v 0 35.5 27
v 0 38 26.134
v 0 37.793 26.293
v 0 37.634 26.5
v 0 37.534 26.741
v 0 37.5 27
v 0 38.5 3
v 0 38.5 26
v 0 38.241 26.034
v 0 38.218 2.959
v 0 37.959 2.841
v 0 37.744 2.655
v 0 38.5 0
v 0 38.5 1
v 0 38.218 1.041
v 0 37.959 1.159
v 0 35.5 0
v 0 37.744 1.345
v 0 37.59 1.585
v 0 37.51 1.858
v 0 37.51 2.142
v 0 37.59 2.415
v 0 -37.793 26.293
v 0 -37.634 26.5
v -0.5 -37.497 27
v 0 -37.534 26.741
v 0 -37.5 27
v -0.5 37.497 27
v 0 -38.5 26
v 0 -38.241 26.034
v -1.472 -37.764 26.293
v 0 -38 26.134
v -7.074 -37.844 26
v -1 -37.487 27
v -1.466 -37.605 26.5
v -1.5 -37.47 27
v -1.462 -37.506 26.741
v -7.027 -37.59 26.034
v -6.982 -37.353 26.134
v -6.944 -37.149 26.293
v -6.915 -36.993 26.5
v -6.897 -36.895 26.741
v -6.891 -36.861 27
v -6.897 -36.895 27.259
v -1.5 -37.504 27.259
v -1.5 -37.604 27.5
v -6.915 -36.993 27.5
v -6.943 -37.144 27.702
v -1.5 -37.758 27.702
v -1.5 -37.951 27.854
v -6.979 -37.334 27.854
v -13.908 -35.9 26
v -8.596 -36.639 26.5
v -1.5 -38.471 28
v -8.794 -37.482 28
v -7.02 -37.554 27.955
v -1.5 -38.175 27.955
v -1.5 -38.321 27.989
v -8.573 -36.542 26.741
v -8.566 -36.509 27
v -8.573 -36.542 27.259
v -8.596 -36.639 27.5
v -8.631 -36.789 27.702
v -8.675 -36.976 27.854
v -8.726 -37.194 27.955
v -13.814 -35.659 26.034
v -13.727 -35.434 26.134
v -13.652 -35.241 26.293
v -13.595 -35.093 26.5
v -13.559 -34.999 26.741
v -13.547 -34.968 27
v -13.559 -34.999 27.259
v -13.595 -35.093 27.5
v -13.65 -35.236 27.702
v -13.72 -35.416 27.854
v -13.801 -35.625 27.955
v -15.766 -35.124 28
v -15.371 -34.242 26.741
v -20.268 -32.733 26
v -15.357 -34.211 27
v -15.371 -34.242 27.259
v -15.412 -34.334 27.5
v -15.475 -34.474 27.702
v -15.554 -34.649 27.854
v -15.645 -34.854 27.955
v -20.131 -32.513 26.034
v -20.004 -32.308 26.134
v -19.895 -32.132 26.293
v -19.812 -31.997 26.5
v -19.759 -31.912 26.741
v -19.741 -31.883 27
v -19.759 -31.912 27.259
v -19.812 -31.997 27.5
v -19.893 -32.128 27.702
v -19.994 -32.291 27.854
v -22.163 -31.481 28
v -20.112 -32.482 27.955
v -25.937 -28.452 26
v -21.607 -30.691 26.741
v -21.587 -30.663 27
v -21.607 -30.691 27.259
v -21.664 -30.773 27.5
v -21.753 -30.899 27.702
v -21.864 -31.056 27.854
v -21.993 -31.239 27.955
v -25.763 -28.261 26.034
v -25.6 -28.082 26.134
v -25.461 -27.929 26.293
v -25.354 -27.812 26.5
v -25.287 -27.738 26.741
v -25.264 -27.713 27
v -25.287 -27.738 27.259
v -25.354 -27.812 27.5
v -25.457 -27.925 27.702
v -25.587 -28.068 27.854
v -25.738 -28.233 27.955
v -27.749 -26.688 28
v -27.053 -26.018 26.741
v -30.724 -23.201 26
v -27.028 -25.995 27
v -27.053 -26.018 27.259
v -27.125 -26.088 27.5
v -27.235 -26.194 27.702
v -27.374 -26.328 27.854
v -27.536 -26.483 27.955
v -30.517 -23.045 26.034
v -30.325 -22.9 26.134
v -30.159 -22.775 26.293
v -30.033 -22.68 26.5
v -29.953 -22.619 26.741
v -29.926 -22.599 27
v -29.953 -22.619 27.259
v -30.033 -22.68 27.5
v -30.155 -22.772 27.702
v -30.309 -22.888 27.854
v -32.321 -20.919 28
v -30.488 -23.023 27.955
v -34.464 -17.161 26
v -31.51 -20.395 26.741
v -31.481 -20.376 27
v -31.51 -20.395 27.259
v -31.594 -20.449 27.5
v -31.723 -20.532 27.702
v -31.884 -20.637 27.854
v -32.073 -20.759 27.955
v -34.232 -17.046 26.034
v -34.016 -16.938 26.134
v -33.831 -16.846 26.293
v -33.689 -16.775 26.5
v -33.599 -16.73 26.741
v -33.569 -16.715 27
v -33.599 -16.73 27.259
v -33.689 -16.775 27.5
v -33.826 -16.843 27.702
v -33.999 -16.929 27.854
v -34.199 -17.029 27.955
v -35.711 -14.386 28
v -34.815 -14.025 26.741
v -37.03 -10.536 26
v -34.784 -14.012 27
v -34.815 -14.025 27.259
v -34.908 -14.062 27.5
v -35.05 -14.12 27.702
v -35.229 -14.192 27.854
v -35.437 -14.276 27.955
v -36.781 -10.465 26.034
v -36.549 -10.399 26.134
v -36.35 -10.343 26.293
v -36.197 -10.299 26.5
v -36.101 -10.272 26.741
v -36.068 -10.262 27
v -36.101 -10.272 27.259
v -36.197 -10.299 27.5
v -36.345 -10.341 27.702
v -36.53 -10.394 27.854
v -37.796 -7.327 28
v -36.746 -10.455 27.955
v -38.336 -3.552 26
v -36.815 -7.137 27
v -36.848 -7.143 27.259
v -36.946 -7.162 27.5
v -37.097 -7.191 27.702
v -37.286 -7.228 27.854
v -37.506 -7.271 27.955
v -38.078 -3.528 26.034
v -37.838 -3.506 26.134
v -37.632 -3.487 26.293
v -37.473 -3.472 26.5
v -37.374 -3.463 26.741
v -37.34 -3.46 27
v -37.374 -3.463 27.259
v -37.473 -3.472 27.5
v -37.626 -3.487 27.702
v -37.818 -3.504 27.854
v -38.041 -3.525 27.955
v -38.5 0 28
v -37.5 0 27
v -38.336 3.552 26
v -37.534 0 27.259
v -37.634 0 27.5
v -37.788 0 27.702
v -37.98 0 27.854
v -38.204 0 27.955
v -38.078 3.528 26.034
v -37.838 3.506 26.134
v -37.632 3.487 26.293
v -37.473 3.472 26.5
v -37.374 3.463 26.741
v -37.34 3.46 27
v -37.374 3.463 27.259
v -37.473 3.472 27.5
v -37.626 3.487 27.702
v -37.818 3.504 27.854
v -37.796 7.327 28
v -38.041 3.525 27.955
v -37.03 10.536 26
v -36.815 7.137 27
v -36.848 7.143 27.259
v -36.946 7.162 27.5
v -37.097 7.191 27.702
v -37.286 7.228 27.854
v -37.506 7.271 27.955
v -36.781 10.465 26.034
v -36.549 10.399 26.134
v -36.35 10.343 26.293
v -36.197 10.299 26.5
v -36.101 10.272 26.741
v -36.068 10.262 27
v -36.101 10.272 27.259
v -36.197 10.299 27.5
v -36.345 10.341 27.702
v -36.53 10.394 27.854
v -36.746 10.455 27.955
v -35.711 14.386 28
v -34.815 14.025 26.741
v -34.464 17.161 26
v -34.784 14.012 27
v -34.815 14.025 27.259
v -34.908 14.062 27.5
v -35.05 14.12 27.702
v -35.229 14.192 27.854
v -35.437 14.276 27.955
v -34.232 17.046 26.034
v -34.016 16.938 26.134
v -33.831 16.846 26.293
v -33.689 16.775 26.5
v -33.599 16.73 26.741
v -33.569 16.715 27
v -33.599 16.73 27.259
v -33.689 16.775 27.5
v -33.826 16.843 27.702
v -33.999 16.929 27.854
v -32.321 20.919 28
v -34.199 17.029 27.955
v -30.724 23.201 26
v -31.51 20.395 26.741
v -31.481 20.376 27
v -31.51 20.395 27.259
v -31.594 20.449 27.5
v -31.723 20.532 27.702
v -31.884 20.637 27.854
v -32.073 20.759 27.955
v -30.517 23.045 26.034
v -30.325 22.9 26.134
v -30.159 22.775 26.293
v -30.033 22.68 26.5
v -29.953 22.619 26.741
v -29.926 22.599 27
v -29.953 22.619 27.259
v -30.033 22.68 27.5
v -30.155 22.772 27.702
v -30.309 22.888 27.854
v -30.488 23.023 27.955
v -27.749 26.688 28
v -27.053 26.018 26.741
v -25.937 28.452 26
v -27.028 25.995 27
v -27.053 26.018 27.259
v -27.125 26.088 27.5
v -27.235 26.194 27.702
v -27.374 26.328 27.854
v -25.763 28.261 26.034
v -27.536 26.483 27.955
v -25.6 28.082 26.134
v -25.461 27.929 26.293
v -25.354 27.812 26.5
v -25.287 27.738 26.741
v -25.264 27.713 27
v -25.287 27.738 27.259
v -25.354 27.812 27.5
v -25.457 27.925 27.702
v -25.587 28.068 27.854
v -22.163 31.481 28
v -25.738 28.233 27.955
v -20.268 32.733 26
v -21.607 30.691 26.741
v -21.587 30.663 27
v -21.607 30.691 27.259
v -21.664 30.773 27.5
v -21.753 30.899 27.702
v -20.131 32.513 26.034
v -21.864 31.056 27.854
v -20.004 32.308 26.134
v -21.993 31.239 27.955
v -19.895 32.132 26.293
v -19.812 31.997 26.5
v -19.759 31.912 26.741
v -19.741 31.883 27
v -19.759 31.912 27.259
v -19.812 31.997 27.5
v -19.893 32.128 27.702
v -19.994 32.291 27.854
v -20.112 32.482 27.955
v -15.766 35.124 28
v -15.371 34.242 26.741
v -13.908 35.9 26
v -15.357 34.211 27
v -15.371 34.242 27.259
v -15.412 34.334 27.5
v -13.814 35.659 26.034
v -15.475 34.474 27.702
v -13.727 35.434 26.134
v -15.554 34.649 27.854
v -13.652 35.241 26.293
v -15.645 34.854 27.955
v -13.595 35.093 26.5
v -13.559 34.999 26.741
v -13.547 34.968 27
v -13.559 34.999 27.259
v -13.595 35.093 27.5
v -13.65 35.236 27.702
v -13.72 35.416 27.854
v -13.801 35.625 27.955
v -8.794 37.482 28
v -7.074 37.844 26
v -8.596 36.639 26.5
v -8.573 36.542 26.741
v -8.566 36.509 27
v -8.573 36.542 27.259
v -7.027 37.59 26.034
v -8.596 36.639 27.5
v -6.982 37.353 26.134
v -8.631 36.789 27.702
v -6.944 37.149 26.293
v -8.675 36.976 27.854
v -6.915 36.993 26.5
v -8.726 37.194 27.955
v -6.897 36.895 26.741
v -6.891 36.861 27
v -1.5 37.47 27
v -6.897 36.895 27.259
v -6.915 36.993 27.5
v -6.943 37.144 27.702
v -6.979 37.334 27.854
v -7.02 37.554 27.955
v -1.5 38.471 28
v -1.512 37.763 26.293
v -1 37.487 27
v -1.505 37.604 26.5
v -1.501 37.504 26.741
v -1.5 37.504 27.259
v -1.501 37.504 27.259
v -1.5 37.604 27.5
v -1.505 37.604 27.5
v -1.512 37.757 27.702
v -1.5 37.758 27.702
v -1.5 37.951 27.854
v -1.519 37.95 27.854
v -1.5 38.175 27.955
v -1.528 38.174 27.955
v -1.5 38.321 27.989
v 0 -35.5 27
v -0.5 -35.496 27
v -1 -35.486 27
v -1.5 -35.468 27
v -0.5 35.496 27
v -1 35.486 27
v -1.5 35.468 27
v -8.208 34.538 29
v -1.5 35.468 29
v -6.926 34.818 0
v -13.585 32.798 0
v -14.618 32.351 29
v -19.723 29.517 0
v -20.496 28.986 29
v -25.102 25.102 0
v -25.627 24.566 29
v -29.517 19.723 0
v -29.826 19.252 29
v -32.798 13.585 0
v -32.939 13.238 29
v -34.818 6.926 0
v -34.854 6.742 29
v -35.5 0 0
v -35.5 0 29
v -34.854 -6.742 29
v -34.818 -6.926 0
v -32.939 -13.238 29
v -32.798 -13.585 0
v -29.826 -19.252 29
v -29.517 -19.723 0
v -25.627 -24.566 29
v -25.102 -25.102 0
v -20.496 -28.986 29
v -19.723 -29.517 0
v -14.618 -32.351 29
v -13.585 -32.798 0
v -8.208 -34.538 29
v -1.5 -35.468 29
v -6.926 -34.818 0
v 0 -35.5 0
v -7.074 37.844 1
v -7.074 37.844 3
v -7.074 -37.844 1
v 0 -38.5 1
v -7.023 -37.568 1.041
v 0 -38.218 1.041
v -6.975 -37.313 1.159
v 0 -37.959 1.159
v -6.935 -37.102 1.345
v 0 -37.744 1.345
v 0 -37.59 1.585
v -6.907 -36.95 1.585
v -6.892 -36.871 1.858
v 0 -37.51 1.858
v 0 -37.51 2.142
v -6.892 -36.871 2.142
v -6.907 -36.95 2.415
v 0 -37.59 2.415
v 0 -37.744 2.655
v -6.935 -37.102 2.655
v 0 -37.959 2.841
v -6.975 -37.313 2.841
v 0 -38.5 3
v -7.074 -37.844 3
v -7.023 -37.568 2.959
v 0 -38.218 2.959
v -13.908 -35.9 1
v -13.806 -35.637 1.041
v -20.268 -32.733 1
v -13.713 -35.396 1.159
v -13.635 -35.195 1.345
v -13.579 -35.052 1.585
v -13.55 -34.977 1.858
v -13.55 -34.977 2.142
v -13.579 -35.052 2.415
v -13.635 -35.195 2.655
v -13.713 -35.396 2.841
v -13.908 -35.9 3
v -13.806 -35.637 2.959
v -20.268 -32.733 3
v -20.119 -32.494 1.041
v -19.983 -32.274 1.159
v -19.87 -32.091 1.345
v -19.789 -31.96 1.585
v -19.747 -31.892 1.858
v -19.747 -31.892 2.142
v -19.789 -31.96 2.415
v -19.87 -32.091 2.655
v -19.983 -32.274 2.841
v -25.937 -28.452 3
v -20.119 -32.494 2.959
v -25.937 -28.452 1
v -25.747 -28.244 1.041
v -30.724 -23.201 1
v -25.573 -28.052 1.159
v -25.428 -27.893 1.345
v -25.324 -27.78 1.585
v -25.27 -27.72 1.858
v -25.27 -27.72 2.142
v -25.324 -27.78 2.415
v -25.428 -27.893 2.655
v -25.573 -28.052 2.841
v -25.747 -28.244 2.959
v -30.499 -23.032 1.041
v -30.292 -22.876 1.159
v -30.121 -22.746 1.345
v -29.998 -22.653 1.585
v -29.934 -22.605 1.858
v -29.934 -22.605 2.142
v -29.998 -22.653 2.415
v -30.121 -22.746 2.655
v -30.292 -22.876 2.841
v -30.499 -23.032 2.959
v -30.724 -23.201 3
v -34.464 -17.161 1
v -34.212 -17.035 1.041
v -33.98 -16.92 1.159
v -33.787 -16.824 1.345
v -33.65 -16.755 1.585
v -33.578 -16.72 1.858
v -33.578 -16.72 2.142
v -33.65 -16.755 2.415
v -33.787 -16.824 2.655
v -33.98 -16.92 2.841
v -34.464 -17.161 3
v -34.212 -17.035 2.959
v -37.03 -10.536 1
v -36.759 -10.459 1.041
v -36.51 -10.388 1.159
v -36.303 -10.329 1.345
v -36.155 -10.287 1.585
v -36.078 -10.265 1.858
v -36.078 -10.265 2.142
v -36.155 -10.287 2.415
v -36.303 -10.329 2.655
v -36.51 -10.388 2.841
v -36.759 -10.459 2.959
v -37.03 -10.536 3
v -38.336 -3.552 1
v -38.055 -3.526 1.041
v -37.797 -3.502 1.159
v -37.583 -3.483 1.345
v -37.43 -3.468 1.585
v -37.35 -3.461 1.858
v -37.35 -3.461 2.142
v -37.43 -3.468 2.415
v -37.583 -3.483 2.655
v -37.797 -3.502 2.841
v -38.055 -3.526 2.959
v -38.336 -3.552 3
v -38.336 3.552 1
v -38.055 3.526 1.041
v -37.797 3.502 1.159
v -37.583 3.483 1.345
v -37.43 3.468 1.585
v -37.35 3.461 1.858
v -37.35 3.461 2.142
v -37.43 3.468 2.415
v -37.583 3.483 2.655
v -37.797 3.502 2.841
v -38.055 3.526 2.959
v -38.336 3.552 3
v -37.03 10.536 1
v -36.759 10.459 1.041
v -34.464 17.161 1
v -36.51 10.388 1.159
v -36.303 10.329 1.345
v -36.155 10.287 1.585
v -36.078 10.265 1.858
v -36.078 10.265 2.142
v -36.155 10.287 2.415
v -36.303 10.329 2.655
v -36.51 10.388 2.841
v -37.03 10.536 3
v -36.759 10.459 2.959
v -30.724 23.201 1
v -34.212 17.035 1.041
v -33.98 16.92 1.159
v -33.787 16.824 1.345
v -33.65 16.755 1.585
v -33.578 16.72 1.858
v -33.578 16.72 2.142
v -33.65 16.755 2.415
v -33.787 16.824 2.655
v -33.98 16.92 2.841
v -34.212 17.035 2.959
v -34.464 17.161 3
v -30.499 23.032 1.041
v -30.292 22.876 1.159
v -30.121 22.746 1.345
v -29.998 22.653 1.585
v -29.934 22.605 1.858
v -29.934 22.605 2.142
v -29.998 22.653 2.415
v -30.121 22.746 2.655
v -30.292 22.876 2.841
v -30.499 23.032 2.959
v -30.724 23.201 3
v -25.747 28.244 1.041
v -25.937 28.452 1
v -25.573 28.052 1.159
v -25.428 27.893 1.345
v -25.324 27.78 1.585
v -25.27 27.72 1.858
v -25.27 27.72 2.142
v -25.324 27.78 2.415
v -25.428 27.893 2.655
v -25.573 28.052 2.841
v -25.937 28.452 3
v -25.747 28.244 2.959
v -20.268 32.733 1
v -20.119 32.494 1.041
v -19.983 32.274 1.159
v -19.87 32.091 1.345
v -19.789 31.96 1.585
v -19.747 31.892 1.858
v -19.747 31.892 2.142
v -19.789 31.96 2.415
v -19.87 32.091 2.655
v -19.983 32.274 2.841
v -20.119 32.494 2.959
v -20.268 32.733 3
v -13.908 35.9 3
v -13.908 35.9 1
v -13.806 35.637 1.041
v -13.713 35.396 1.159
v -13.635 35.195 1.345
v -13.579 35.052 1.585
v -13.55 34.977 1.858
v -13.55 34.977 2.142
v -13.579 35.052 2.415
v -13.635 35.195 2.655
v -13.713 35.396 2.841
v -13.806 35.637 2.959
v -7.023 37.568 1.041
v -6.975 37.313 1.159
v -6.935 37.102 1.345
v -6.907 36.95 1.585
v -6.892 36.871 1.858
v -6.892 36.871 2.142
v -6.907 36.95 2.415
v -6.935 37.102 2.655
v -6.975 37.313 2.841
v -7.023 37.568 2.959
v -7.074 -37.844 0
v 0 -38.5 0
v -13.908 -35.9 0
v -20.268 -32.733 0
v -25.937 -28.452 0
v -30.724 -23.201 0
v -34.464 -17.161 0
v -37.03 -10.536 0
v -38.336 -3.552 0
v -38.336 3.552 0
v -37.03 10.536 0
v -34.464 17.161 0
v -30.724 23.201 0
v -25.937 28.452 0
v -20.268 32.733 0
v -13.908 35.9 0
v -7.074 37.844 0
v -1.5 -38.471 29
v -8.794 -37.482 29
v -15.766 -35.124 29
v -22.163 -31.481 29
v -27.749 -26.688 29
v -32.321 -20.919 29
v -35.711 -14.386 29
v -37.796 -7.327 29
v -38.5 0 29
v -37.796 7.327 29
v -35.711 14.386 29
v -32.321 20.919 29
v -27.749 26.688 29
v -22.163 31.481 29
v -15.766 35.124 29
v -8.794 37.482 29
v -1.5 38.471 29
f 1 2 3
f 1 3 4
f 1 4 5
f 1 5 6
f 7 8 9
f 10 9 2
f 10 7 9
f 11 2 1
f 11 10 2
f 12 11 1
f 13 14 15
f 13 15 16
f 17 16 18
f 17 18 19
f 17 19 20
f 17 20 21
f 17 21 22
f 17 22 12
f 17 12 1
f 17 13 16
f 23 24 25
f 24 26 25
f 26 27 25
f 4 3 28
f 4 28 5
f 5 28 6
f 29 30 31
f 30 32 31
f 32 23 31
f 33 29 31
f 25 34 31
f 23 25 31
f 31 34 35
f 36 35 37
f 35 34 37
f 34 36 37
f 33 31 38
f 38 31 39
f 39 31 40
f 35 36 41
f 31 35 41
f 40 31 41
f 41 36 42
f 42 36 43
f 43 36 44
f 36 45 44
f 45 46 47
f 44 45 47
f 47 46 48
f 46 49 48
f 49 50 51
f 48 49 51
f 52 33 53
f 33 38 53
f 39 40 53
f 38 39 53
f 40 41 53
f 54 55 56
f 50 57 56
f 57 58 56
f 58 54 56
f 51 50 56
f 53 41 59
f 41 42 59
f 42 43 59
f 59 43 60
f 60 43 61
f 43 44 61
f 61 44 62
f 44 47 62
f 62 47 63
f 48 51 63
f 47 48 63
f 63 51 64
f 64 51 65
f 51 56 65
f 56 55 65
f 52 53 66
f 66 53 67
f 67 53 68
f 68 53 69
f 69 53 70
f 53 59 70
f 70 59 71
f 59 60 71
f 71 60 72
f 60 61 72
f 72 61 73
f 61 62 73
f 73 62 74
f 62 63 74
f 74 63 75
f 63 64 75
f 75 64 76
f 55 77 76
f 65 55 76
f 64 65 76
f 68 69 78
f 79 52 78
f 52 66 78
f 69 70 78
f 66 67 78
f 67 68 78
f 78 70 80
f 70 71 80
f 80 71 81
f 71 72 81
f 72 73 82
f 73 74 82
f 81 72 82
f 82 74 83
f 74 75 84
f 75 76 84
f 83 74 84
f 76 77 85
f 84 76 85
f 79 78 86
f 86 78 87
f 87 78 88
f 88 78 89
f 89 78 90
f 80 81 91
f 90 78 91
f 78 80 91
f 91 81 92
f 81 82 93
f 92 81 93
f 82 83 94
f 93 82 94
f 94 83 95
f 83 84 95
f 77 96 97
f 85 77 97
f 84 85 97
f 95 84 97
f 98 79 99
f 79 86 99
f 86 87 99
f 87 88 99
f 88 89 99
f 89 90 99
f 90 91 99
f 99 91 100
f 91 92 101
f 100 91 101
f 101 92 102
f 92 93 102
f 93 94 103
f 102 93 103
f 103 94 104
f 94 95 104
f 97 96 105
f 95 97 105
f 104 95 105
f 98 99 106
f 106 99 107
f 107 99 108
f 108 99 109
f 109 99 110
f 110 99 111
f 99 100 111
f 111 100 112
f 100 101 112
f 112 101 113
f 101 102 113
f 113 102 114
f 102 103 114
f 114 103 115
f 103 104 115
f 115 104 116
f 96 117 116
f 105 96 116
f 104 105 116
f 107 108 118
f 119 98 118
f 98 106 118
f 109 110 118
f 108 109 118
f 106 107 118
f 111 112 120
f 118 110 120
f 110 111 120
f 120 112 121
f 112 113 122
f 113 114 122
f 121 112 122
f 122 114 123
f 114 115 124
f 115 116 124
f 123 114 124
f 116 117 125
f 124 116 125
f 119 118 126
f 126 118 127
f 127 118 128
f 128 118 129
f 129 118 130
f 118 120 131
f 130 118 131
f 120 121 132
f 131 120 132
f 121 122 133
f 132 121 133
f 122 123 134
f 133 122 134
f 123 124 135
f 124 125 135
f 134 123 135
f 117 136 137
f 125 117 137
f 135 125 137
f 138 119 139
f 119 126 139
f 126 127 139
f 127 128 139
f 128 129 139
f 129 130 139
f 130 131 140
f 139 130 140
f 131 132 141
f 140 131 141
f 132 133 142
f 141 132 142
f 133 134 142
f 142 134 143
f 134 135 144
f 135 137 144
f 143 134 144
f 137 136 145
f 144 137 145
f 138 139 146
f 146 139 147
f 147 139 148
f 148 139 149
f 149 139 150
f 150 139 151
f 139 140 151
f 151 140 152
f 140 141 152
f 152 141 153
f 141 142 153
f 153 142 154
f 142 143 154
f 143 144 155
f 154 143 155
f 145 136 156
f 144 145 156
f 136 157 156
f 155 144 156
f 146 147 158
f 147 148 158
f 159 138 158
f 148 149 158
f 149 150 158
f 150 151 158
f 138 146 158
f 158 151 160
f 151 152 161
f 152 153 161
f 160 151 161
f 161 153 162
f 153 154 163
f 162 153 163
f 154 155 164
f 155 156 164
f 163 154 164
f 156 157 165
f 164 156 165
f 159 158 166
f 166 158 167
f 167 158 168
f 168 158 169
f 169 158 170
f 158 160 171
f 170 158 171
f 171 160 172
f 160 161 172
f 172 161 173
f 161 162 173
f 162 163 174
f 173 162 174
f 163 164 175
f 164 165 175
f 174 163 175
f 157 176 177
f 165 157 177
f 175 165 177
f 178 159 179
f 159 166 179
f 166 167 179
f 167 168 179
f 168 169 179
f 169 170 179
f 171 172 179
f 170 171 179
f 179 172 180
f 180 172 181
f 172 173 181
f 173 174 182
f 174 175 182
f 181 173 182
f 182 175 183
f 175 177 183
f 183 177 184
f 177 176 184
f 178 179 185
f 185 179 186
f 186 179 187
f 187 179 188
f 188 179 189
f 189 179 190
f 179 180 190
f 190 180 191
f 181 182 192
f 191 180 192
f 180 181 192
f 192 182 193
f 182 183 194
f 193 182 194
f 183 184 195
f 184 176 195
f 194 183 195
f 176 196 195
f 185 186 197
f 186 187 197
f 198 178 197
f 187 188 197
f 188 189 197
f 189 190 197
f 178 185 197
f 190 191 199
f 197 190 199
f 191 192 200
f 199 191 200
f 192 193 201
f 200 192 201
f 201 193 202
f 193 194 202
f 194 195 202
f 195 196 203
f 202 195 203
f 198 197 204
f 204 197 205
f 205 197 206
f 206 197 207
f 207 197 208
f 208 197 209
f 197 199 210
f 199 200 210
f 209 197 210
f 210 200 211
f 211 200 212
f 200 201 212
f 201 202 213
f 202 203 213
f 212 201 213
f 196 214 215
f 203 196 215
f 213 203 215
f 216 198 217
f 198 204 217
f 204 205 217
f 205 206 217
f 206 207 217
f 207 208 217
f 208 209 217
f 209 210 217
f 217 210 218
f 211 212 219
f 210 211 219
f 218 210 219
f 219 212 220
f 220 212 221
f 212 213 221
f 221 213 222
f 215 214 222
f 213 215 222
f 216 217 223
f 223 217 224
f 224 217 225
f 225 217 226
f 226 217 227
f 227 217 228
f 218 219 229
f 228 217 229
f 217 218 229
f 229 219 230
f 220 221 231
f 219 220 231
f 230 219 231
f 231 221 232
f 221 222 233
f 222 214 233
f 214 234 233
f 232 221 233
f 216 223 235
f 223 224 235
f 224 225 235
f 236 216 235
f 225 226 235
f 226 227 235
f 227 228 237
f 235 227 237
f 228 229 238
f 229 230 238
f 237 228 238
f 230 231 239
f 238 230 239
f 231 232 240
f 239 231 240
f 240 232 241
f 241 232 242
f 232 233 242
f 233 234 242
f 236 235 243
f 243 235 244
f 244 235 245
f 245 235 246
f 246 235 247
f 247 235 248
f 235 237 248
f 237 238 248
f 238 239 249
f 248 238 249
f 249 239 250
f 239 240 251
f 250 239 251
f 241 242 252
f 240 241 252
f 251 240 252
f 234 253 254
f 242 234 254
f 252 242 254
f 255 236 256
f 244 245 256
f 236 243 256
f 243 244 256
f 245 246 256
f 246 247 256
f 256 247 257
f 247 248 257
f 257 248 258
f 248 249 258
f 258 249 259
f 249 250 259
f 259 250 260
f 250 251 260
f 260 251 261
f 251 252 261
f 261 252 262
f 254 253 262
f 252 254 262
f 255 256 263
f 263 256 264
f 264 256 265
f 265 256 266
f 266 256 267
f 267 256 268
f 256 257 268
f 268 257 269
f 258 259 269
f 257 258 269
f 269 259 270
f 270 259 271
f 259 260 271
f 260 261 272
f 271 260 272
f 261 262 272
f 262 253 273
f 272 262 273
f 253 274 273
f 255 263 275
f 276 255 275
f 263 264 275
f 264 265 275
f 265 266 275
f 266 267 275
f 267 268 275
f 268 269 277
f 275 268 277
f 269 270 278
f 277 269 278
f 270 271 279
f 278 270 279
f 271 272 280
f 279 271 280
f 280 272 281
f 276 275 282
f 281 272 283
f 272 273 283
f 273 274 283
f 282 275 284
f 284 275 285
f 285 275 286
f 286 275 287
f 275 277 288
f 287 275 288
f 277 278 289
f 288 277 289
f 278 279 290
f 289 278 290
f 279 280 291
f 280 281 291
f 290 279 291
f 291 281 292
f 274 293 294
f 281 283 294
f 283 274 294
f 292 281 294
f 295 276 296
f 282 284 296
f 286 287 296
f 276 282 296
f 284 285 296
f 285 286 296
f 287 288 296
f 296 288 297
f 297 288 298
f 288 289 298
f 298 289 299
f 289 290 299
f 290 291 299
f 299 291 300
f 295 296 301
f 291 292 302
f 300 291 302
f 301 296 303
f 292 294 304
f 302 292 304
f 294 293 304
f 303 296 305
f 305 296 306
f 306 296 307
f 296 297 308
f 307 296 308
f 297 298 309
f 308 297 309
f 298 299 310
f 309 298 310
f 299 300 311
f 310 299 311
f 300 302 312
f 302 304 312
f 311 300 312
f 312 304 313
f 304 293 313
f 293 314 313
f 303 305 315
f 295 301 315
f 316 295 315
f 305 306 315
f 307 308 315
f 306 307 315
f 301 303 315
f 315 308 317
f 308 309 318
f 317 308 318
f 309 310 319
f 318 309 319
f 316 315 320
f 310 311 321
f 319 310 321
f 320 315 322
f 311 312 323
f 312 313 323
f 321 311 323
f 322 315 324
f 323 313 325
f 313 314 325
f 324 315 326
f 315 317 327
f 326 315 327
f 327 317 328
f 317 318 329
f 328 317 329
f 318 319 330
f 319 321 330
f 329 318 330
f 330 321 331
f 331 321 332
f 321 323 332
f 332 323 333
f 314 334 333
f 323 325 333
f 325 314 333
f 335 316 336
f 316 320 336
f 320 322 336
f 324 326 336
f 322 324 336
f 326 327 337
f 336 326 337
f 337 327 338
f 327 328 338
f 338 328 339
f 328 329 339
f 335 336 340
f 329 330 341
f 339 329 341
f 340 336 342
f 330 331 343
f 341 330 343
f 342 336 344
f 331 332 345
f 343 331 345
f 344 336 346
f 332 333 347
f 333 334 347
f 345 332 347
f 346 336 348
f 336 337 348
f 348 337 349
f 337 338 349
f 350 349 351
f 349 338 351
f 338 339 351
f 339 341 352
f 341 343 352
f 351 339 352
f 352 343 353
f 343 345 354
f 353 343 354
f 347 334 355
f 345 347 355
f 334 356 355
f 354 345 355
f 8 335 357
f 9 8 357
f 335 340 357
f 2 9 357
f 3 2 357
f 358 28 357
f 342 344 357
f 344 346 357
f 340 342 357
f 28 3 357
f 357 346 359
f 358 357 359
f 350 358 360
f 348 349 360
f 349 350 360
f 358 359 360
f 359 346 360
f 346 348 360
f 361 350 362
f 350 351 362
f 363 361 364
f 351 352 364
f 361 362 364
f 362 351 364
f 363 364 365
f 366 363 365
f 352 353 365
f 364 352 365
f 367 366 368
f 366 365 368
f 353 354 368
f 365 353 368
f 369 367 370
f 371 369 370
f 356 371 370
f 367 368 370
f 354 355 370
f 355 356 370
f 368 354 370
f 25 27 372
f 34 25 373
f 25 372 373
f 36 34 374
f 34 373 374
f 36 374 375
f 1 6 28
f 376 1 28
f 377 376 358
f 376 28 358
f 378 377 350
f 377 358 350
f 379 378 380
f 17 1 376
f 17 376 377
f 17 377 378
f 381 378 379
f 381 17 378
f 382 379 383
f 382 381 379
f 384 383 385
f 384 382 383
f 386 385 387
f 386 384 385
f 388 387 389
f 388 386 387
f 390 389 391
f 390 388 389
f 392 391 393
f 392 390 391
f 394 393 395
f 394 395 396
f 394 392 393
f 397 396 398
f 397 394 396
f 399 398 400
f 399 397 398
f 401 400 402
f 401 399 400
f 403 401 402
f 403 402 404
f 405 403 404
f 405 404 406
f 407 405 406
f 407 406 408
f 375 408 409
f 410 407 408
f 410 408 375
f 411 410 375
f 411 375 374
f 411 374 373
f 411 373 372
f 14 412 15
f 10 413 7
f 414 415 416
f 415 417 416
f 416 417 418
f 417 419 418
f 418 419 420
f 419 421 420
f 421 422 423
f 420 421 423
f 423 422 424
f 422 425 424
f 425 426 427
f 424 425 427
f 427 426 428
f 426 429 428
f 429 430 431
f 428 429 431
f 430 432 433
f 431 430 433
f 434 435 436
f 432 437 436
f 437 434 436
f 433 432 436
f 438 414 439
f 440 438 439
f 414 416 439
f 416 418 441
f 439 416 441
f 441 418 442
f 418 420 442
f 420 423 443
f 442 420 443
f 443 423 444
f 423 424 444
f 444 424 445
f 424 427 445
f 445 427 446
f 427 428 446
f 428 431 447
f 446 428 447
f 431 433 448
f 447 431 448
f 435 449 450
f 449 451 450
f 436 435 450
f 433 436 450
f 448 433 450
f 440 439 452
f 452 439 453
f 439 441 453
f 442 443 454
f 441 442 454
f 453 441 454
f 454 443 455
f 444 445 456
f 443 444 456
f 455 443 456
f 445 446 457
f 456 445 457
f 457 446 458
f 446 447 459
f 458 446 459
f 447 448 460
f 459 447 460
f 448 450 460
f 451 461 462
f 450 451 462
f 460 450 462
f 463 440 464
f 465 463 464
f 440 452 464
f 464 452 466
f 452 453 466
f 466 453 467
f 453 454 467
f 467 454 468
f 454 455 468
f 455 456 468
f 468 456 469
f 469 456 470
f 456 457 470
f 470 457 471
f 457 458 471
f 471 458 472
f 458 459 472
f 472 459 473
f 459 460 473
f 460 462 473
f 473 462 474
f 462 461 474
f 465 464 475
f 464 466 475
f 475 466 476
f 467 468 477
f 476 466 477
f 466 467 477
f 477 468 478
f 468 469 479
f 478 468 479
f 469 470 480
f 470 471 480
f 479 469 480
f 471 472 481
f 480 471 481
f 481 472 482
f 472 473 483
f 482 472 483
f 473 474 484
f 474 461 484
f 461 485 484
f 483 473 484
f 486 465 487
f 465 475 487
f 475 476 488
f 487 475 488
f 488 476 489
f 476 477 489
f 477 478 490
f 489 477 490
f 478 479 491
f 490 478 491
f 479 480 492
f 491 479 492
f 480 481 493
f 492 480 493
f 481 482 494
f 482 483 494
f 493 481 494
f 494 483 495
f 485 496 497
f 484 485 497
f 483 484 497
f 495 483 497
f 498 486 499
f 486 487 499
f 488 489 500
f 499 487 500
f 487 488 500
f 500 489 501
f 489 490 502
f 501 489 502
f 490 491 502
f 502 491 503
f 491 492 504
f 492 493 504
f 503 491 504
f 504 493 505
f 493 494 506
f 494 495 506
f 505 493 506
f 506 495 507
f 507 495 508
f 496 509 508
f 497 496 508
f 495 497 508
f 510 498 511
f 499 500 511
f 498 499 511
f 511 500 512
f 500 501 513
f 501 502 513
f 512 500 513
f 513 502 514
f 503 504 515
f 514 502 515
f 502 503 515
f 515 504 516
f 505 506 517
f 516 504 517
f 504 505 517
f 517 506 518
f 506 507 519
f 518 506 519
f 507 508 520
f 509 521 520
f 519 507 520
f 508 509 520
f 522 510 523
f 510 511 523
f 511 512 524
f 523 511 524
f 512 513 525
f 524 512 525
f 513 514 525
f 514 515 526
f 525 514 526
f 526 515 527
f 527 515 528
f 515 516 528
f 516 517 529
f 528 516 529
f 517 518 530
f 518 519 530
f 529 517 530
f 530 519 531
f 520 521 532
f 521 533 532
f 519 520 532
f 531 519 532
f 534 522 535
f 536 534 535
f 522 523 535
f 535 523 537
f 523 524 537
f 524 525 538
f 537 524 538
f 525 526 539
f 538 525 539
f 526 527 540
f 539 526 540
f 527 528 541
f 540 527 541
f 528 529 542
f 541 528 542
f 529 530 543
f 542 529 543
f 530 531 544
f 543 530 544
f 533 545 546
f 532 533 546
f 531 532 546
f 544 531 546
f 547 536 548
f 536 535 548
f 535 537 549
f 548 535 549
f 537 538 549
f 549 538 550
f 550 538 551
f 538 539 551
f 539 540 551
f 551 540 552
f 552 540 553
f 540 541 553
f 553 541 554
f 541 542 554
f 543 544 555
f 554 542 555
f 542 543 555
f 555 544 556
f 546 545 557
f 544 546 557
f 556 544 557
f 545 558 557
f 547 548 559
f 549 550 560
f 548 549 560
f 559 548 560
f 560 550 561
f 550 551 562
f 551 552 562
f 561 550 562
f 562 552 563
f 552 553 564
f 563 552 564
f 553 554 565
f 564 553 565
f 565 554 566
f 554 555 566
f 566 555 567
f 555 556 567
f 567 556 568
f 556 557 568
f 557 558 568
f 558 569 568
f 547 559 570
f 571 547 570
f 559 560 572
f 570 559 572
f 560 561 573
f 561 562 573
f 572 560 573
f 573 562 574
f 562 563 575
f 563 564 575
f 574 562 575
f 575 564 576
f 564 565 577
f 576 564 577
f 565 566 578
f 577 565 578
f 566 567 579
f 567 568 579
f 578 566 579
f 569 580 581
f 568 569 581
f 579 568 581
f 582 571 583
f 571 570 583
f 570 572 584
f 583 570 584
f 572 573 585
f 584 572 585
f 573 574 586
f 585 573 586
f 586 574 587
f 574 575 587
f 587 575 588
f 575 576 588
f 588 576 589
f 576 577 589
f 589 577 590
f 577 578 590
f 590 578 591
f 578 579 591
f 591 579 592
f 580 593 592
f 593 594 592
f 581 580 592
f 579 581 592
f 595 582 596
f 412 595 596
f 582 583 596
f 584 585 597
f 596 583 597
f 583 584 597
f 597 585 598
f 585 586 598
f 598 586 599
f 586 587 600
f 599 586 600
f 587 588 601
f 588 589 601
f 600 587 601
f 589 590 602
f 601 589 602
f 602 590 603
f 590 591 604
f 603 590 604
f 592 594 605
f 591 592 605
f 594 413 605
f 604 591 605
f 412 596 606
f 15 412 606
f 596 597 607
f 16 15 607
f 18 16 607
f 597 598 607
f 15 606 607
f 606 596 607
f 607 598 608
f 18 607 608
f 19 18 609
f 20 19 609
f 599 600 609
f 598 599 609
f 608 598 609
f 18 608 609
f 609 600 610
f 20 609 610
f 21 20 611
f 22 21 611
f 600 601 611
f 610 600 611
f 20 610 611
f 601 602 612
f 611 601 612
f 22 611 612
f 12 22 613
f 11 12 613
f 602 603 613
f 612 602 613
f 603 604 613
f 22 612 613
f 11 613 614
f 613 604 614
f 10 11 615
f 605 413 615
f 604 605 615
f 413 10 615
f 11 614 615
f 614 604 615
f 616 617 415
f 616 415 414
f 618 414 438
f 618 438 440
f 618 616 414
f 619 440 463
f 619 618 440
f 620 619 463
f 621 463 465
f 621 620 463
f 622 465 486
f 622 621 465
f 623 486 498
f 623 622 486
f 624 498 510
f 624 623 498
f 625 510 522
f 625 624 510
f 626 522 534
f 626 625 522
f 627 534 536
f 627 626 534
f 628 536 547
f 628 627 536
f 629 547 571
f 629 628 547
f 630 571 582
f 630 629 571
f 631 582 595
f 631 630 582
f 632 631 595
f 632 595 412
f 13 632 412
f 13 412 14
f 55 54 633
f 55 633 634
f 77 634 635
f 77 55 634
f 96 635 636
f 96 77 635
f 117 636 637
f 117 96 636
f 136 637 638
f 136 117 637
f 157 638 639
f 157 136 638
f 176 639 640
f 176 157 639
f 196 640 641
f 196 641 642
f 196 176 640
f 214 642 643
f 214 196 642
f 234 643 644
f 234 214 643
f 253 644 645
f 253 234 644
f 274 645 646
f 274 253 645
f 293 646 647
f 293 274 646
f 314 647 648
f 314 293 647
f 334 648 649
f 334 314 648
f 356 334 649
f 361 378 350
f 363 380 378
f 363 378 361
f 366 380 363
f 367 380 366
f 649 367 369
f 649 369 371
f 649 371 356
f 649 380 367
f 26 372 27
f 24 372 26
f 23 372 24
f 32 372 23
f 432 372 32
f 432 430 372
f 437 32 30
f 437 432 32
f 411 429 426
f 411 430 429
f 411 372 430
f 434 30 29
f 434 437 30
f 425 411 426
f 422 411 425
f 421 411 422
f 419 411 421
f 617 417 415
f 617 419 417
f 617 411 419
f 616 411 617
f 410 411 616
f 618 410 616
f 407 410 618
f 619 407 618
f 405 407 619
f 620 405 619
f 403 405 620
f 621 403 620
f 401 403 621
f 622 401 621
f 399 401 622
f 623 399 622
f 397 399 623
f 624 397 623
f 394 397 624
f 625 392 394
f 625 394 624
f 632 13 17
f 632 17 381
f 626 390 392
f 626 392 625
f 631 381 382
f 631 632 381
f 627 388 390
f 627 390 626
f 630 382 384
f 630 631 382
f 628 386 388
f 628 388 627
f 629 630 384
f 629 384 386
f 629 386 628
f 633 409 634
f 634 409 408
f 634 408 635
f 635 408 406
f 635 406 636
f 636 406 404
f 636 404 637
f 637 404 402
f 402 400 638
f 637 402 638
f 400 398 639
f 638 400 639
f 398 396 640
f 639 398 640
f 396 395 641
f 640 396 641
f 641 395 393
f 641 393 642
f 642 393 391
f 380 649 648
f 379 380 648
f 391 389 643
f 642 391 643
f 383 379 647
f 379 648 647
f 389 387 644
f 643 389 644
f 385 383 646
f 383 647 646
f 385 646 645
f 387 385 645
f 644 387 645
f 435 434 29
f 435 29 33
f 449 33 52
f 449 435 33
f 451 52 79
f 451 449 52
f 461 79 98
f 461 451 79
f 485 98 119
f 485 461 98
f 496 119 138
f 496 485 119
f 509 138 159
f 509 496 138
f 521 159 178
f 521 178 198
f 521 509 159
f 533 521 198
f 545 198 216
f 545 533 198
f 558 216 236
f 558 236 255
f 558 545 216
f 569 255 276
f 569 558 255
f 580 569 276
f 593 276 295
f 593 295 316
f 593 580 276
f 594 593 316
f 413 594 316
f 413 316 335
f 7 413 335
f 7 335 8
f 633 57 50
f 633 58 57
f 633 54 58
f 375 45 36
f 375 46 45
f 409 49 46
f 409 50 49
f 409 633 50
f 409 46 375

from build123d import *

# Parameters (mm, degrees)
MAIN_SHELL_DEPTH = 29
END_STOP_DEPTH   = 2


with BuildPart() as part:
    # Sketch1 → Main Shell (new body)
    with BuildSketch(Plane.XY):
        with BuildLine():
            Line((0, 38.5), (0, 35.5))
            ThreePointArc((0, 35.5), (-35.5, 0), (0, -35.5))
            Line((0, -35.5), (0, -38.5))
            ThreePointArc((0, -38.5), (-38.5, 0), (0, 38.5))
        make_face()
    extrude(amount=MAIN_SHELL_DEPTH)

    # Sketch3 → Rubber Band Holder (revolve, cut)
    with BuildSketch(Plane(origin=(0, 0, 0), x_dir=(0, 0, -1), z_dir=(1, 0, 0))):
        with BuildLine():
            Line((-28, 38.5), (-26, 38.5))
            ThreePointArc((-26, 38.5), (-27, 37.5), (-28, 38.5))
        make_face()
        with BuildLine():
            Line((-3, 38.5), (-1, 38.5))
            ThreePointArc((-1, 38.5), (-2, 37.5), (-3, 38.5))
        make_face()
    revolve(axis=Axis((0, 0, 29), (0, 0, -1)), mode=Mode.SUBTRACT)

    # Sketch4 → End Stop (cut)
    with BuildSketch(Plane.XY.offset(29)):
        with BuildLine():
            Line((0, 38.5), (0, 35.5))
            ThreePointArc((0, 35.5), (-0.750167508, 35.49207304), (-1.5, 35.468295702))
            Line((-1.5, 35.468295702), (-1.5, 38.470768123))
            ThreePointArc((-1.5, 38.470768123), (-0.750142404, 38.492691337), (0, 38.5))
        make_face()
        with BuildLine():
            Line((-1.5, -38.470768123), (-1.5, -35.468295702))
            ThreePointArc((-1.5, -35.468295702), (-0.750167508, -35.49207304), (0, -35.5))
            Line((0, -35.5), (0, -38.5))
            ThreePointArc((0, -38.5), (-0.750142404, -38.492691337), (-1.5, -38.470768123))
        make_face()
    extrude(amount=-END_STOP_DEPTH, mode=Mode.SUBTRACT)


solid = part.part
